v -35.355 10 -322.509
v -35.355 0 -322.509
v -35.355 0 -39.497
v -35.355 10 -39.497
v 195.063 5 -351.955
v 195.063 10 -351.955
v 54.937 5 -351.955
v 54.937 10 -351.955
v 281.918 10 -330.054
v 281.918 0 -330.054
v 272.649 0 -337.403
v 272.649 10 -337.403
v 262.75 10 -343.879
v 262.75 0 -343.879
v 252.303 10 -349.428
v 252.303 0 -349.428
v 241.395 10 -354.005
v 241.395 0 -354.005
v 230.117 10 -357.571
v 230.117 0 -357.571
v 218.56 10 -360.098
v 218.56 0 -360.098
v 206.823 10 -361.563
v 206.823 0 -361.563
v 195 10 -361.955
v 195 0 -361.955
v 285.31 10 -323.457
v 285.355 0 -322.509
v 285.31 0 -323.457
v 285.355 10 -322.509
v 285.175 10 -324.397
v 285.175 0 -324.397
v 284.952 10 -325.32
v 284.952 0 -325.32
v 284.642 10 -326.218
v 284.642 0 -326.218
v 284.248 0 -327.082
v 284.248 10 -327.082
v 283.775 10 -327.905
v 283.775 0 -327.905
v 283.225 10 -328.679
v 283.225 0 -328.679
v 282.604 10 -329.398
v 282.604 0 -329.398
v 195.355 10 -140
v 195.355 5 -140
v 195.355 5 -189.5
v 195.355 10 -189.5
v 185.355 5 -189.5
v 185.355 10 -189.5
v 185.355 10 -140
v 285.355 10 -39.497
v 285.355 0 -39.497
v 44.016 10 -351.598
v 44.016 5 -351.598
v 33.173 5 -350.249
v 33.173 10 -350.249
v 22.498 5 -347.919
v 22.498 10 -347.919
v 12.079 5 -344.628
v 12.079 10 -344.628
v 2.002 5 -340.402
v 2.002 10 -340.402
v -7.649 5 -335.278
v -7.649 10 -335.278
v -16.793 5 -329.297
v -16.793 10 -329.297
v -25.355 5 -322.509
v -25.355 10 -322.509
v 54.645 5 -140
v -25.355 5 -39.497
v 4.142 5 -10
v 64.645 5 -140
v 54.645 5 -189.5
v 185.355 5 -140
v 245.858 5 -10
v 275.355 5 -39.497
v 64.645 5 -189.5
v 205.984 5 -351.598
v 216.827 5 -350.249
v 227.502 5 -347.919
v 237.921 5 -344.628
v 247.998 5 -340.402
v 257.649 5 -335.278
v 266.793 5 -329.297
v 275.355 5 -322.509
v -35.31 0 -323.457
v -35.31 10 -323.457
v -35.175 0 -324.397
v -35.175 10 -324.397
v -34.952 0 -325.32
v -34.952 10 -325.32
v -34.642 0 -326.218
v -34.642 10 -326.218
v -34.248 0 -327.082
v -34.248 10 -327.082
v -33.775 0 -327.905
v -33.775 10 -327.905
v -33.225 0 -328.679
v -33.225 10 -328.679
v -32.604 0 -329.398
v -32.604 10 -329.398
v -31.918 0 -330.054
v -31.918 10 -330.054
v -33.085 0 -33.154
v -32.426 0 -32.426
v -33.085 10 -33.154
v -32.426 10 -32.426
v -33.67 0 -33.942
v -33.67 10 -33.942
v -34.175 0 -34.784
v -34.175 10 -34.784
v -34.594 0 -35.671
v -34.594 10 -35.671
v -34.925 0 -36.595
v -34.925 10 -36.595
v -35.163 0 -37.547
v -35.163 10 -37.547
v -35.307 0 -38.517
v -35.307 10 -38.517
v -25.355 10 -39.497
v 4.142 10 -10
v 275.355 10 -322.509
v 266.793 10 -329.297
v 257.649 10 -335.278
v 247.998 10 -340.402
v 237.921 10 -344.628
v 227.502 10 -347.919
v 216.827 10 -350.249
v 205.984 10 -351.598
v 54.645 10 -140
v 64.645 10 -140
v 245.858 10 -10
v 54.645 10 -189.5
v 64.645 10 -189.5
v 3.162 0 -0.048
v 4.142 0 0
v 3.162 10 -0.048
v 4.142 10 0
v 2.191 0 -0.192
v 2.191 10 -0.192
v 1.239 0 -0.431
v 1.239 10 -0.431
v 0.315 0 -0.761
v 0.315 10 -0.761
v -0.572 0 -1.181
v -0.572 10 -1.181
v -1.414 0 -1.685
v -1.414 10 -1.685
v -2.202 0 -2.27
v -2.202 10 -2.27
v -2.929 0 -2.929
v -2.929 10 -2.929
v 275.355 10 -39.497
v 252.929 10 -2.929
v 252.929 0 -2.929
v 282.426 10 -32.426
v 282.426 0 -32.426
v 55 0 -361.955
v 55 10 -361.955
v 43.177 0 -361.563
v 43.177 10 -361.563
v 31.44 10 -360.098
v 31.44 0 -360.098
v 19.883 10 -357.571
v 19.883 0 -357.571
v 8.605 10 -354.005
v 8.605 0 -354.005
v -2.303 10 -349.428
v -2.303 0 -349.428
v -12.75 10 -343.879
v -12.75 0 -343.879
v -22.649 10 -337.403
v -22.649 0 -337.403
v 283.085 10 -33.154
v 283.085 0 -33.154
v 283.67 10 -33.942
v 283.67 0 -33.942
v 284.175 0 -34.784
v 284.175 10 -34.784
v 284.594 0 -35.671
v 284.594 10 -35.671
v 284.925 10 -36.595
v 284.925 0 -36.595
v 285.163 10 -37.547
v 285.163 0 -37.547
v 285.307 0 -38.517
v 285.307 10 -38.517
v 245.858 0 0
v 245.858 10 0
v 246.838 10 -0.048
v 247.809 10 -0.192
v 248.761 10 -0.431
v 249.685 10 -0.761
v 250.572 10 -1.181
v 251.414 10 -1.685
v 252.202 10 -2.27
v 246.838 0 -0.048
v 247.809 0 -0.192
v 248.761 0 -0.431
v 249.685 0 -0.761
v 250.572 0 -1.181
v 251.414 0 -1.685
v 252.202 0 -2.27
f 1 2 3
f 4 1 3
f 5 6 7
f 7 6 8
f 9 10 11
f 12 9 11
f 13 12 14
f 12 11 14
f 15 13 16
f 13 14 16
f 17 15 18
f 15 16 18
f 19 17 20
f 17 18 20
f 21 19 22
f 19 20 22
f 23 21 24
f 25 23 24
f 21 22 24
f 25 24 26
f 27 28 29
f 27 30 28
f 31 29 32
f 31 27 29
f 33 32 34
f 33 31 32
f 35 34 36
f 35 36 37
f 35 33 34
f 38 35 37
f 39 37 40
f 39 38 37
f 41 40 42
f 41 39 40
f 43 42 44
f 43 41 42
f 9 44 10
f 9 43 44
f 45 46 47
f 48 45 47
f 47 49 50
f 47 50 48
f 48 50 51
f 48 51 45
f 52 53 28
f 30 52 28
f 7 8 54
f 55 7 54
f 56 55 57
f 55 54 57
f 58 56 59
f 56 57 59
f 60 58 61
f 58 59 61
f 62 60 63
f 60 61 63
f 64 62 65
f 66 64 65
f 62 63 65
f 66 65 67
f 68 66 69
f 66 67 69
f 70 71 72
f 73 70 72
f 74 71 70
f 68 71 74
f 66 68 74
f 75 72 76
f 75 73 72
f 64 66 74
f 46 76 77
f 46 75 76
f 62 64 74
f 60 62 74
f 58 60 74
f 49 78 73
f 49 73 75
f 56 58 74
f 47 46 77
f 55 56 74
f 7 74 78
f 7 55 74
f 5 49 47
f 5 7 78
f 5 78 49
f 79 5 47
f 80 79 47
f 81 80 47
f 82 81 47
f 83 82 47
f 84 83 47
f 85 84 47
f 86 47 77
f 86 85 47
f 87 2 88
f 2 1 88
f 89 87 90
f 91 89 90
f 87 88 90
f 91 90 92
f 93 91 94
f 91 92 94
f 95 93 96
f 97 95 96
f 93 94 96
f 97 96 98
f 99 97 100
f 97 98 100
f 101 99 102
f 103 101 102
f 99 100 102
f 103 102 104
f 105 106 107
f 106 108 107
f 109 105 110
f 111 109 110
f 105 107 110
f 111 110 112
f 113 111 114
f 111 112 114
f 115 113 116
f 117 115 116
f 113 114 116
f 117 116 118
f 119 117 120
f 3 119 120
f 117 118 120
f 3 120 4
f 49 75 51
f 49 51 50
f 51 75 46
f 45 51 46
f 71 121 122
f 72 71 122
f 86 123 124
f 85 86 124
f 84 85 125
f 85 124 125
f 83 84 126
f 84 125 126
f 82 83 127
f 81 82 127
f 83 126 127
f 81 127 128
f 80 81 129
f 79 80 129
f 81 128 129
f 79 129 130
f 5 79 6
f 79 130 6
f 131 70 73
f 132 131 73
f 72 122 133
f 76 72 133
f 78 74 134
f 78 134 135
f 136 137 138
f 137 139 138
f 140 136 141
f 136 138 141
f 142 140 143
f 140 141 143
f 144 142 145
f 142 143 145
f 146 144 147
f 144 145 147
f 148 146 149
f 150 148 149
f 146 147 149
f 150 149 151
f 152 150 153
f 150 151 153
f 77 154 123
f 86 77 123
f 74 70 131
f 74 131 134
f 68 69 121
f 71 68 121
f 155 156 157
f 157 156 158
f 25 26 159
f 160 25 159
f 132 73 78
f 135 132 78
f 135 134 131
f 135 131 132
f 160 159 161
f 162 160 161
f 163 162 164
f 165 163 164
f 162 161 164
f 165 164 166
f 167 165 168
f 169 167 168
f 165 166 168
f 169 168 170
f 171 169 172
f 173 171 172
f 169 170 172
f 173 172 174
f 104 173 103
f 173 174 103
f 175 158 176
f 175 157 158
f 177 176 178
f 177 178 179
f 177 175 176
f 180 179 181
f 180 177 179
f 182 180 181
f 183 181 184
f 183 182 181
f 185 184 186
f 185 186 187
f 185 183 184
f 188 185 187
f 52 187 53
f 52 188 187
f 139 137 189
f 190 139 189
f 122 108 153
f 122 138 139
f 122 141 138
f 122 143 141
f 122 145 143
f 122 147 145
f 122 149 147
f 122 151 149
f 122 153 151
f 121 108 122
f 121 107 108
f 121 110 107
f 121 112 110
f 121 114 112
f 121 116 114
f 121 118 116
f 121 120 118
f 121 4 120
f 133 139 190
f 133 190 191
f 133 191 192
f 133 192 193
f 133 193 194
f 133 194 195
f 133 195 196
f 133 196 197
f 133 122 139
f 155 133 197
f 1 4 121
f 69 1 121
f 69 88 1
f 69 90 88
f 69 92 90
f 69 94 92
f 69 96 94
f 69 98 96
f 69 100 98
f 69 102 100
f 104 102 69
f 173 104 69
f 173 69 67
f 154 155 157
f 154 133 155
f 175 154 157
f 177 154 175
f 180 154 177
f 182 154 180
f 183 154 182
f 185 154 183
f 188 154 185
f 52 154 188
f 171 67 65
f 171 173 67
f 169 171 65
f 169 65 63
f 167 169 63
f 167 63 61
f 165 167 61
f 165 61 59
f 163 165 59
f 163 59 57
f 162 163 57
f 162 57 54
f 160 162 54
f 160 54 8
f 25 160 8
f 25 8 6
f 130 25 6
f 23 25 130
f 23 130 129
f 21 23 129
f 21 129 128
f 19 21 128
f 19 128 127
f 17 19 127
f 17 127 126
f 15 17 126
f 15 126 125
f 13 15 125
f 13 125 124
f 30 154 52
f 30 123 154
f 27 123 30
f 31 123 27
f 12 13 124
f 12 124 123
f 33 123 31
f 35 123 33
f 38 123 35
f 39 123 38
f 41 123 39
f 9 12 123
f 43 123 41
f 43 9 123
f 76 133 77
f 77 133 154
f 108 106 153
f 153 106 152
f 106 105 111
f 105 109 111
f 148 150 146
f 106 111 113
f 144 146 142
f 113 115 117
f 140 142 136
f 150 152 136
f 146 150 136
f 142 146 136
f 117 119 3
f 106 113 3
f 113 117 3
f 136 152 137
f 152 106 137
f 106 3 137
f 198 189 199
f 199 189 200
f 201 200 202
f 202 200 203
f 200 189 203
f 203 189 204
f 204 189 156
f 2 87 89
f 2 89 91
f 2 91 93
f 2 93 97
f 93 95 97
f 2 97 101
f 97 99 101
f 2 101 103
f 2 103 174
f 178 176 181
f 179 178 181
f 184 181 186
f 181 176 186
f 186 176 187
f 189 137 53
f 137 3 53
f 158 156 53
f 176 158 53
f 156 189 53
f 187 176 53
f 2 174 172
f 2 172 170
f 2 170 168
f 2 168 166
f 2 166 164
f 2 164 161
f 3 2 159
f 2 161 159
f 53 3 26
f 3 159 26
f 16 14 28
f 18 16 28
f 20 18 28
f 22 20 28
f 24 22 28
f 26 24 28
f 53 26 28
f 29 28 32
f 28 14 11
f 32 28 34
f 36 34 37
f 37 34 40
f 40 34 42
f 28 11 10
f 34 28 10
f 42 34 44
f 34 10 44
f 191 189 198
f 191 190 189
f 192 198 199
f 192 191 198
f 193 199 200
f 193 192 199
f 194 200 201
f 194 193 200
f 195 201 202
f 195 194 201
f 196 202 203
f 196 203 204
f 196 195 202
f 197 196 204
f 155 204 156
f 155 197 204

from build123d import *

# Parameters (mm, degrees)
BODY_DEPTH                   = 10
INSIDE_BODY_DEPTH            = 5
SKETCH3_W                    = 10
SKETCH3_H                    = 49.5
HORIZONTAL_CONSTRAINTS_DEPTH = 5
FILLET1_R                    = 10


with BuildPart() as part:
    # Sketch1 → Body (new body)
    with BuildSketch(Plane(origin=(0, 0, 0), x_dir=(1, 0, 0), z_dir=(0, 1, 0))):
        with BuildLine():
            Line((0, 0), (250, 0))
            Line((250, 0), (285.355339059, 35.355339059))
            Line((285.355339059, 35.355339059), (285.355339059, 326.955339059))
            ThreePointArc((285.355339059, 326.955339059), (243.560486982, 353.188356712), (195, 361.955339059))
            Line((195, 361.955339059), (55, 361.955339059))
            ThreePointArc((55, 361.955339059), (6.439513018, 353.188356712), (-35.355339059, 326.955339059))
            Line((-35.355339059, 326.955339059), (-35.355339059, 35.355339059))
            Line((-35.355339059, 35.355339059), (0, 0))
        make_face()
    extrude(amount=BODY_DEPTH)

    # Sketch2 → Inside Body (cut)
    with BuildSketch(Plane(origin=(0, 10, 0), x_dir=(1, 0, 0), z_dir=(0, 1, 0))):
        with BuildLine():
            Line((-25.355339059, 322.508901748), (-25.355339059, 39.497474683))
            Line((-25.355339059, 39.497474683), (4.142135624, 10))
            Line((4.142135624, 10), (245.857864376, 10))
            Line((245.857864376, 10), (275.355339059, 39.497474683))
            Line((275.355339059, 39.497474683), (275.355339059, 322.508901748))
            ThreePointArc((275.355339059, 322.508901748), (237.921386907, 344.627720124), (195.062911656, 351.955339059))
            Line((195.062911656, 351.955339059), (54.937088344, 351.955339059))
            ThreePointArc((54.937088344, 351.955339059), (12.078613093, 344.627720124), (-25.355339059, 322.508901748))
        make_face()
    extrude(amount=-INSIDE_BODY_DEPTH, mode=Mode.SUBTRACT)

    # Sketch3 → Horizontal Constraints (add)
    with BuildSketch(Plane(origin=(0, 5, 0), x_dir=(1, 0, 0), z_dir=(0, 1, 0))):
        with Locations((59.644660941, 164.75)):
            Rectangle(SKETCH3_W, SKETCH3_H)
        with Locations((190.355339059, 164.75)):
            Rectangle(SKETCH3_W, SKETCH3_H)
    extrude(amount=HORIZONTAL_CONSTRAINTS_DEPTH)

    # Fillet1
    fillet1_edges = [part.edges().sort_by_distance(p)[0] for p in [
        (-35.355339059, 5, -326.955339059),
        (285.355339059, 5, -326.955339059),
        (285.355339059, 5, -35.355339059),
        (250, 5, 0),
        (0, 5, 0),
        (-35.355339059, 5, -35.355339059),
    ]]
    fillet(fillet1_edges, radius=FILLET1_R)


solid = part.part
